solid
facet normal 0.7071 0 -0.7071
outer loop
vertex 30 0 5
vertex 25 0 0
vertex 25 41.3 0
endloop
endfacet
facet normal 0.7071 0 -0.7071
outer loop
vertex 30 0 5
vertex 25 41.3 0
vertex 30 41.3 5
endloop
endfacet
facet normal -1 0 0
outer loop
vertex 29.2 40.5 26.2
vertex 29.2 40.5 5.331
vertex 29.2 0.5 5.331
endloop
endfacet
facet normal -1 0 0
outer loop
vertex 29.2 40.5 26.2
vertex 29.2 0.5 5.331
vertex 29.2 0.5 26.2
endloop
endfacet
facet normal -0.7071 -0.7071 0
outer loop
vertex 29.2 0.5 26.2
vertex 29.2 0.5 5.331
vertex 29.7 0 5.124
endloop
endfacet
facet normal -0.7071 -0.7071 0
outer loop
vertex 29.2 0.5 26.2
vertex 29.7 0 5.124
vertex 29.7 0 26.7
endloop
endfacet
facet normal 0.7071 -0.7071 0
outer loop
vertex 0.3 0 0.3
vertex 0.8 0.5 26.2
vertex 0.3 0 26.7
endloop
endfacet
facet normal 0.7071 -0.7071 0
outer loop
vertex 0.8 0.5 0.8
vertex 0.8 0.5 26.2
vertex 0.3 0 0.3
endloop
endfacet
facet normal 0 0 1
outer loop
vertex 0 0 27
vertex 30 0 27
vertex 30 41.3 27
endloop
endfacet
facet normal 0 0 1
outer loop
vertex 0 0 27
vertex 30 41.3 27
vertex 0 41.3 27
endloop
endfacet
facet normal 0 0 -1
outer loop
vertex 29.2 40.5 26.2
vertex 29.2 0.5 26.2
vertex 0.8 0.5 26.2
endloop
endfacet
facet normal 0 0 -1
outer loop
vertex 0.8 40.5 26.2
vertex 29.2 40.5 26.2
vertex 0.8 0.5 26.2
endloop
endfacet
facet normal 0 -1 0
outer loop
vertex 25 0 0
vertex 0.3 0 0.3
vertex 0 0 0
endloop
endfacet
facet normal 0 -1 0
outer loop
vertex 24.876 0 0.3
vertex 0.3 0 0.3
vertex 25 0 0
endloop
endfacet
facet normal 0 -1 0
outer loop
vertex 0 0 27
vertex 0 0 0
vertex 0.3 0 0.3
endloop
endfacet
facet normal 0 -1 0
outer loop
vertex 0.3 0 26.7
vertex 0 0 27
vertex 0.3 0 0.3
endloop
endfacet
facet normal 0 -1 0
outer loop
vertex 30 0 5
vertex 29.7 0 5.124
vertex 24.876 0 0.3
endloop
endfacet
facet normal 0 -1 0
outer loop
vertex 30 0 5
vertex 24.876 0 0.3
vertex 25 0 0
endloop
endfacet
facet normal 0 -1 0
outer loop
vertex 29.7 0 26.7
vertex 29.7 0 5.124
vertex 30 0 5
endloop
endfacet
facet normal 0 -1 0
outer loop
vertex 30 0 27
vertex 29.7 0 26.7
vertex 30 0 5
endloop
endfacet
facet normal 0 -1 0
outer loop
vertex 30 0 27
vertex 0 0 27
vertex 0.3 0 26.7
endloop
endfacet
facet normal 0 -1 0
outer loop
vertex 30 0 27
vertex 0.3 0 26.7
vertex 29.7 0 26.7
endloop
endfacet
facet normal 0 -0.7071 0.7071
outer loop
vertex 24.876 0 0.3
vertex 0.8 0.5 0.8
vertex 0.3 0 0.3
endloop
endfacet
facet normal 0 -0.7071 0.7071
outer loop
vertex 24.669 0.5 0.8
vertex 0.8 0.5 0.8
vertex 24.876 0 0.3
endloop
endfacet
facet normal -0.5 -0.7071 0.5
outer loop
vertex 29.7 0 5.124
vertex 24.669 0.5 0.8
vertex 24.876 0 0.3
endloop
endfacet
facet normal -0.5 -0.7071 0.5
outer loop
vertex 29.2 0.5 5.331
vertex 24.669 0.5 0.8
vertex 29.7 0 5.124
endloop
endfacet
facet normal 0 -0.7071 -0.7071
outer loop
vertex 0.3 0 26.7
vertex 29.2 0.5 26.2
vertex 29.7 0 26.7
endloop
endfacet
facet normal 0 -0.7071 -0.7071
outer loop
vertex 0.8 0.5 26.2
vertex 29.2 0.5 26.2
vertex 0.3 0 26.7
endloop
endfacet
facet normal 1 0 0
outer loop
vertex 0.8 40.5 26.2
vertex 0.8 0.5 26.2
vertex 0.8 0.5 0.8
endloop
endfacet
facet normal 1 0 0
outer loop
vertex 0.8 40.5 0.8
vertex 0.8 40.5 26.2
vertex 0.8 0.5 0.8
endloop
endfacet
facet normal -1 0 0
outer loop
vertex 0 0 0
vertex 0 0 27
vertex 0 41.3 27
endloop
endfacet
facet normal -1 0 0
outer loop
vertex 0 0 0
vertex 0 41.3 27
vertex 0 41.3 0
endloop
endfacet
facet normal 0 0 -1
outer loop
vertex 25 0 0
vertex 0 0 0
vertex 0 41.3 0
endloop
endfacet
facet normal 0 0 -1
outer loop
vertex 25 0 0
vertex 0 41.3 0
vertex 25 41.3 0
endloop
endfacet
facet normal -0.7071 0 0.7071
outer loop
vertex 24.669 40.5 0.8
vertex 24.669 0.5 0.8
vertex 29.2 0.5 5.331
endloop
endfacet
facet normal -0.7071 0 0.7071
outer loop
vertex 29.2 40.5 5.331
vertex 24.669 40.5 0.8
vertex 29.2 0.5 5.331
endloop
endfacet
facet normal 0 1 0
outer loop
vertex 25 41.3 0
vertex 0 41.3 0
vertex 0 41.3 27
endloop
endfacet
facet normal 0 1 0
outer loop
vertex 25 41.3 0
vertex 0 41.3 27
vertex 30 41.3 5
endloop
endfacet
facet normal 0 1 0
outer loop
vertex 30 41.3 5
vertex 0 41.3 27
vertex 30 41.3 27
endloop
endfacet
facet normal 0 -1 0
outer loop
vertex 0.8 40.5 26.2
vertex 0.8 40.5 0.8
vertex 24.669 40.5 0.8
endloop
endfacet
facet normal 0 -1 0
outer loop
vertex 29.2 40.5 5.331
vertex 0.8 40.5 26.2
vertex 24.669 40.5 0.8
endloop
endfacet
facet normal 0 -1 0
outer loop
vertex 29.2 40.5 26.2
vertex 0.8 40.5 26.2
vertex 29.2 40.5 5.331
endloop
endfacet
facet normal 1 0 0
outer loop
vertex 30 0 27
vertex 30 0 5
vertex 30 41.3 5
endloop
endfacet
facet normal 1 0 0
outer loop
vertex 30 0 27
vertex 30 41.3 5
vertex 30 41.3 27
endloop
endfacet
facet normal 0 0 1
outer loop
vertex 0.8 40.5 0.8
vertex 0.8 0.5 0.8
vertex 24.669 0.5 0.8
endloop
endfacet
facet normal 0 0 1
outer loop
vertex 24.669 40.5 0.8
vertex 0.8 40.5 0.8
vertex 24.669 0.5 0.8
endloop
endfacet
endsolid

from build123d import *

# Parameters (mm, degrees)
F2_DEPTH = 41.3
F3_T     = -0.8
F4_SIZE  = 0.5


with BuildPart() as f2:
    # F1 (on Front) → F2 (new body)
    with BuildSketch(Plane.XZ):
        Polygon((0, 27), (0, 0), (25, 0), (30, 5), (30, 27), align=None)
    extrude(amount=-F2_DEPTH)

    # F3
    f3_openings = [f2.faces().sort_by_distance(p)[0] for p in [
        (14.791014, 0, 13.685475),
    ]]
    offset(amount=F3_T, openings=f3_openings)

    # F4
    f4_edges = [f2.edges().sort_by_distance(p)[0] for p in [
        (15, 0, 26.2),
        (29.2, 0, 15.765685),
        (26.934315, 0, 3.065685),
        (12.734315, 0, 0.8),
        (0.8, 0, 13.5),
    ]]
    chamfer(f4_edges, length=F4_SIZE)


solid = f2.part
